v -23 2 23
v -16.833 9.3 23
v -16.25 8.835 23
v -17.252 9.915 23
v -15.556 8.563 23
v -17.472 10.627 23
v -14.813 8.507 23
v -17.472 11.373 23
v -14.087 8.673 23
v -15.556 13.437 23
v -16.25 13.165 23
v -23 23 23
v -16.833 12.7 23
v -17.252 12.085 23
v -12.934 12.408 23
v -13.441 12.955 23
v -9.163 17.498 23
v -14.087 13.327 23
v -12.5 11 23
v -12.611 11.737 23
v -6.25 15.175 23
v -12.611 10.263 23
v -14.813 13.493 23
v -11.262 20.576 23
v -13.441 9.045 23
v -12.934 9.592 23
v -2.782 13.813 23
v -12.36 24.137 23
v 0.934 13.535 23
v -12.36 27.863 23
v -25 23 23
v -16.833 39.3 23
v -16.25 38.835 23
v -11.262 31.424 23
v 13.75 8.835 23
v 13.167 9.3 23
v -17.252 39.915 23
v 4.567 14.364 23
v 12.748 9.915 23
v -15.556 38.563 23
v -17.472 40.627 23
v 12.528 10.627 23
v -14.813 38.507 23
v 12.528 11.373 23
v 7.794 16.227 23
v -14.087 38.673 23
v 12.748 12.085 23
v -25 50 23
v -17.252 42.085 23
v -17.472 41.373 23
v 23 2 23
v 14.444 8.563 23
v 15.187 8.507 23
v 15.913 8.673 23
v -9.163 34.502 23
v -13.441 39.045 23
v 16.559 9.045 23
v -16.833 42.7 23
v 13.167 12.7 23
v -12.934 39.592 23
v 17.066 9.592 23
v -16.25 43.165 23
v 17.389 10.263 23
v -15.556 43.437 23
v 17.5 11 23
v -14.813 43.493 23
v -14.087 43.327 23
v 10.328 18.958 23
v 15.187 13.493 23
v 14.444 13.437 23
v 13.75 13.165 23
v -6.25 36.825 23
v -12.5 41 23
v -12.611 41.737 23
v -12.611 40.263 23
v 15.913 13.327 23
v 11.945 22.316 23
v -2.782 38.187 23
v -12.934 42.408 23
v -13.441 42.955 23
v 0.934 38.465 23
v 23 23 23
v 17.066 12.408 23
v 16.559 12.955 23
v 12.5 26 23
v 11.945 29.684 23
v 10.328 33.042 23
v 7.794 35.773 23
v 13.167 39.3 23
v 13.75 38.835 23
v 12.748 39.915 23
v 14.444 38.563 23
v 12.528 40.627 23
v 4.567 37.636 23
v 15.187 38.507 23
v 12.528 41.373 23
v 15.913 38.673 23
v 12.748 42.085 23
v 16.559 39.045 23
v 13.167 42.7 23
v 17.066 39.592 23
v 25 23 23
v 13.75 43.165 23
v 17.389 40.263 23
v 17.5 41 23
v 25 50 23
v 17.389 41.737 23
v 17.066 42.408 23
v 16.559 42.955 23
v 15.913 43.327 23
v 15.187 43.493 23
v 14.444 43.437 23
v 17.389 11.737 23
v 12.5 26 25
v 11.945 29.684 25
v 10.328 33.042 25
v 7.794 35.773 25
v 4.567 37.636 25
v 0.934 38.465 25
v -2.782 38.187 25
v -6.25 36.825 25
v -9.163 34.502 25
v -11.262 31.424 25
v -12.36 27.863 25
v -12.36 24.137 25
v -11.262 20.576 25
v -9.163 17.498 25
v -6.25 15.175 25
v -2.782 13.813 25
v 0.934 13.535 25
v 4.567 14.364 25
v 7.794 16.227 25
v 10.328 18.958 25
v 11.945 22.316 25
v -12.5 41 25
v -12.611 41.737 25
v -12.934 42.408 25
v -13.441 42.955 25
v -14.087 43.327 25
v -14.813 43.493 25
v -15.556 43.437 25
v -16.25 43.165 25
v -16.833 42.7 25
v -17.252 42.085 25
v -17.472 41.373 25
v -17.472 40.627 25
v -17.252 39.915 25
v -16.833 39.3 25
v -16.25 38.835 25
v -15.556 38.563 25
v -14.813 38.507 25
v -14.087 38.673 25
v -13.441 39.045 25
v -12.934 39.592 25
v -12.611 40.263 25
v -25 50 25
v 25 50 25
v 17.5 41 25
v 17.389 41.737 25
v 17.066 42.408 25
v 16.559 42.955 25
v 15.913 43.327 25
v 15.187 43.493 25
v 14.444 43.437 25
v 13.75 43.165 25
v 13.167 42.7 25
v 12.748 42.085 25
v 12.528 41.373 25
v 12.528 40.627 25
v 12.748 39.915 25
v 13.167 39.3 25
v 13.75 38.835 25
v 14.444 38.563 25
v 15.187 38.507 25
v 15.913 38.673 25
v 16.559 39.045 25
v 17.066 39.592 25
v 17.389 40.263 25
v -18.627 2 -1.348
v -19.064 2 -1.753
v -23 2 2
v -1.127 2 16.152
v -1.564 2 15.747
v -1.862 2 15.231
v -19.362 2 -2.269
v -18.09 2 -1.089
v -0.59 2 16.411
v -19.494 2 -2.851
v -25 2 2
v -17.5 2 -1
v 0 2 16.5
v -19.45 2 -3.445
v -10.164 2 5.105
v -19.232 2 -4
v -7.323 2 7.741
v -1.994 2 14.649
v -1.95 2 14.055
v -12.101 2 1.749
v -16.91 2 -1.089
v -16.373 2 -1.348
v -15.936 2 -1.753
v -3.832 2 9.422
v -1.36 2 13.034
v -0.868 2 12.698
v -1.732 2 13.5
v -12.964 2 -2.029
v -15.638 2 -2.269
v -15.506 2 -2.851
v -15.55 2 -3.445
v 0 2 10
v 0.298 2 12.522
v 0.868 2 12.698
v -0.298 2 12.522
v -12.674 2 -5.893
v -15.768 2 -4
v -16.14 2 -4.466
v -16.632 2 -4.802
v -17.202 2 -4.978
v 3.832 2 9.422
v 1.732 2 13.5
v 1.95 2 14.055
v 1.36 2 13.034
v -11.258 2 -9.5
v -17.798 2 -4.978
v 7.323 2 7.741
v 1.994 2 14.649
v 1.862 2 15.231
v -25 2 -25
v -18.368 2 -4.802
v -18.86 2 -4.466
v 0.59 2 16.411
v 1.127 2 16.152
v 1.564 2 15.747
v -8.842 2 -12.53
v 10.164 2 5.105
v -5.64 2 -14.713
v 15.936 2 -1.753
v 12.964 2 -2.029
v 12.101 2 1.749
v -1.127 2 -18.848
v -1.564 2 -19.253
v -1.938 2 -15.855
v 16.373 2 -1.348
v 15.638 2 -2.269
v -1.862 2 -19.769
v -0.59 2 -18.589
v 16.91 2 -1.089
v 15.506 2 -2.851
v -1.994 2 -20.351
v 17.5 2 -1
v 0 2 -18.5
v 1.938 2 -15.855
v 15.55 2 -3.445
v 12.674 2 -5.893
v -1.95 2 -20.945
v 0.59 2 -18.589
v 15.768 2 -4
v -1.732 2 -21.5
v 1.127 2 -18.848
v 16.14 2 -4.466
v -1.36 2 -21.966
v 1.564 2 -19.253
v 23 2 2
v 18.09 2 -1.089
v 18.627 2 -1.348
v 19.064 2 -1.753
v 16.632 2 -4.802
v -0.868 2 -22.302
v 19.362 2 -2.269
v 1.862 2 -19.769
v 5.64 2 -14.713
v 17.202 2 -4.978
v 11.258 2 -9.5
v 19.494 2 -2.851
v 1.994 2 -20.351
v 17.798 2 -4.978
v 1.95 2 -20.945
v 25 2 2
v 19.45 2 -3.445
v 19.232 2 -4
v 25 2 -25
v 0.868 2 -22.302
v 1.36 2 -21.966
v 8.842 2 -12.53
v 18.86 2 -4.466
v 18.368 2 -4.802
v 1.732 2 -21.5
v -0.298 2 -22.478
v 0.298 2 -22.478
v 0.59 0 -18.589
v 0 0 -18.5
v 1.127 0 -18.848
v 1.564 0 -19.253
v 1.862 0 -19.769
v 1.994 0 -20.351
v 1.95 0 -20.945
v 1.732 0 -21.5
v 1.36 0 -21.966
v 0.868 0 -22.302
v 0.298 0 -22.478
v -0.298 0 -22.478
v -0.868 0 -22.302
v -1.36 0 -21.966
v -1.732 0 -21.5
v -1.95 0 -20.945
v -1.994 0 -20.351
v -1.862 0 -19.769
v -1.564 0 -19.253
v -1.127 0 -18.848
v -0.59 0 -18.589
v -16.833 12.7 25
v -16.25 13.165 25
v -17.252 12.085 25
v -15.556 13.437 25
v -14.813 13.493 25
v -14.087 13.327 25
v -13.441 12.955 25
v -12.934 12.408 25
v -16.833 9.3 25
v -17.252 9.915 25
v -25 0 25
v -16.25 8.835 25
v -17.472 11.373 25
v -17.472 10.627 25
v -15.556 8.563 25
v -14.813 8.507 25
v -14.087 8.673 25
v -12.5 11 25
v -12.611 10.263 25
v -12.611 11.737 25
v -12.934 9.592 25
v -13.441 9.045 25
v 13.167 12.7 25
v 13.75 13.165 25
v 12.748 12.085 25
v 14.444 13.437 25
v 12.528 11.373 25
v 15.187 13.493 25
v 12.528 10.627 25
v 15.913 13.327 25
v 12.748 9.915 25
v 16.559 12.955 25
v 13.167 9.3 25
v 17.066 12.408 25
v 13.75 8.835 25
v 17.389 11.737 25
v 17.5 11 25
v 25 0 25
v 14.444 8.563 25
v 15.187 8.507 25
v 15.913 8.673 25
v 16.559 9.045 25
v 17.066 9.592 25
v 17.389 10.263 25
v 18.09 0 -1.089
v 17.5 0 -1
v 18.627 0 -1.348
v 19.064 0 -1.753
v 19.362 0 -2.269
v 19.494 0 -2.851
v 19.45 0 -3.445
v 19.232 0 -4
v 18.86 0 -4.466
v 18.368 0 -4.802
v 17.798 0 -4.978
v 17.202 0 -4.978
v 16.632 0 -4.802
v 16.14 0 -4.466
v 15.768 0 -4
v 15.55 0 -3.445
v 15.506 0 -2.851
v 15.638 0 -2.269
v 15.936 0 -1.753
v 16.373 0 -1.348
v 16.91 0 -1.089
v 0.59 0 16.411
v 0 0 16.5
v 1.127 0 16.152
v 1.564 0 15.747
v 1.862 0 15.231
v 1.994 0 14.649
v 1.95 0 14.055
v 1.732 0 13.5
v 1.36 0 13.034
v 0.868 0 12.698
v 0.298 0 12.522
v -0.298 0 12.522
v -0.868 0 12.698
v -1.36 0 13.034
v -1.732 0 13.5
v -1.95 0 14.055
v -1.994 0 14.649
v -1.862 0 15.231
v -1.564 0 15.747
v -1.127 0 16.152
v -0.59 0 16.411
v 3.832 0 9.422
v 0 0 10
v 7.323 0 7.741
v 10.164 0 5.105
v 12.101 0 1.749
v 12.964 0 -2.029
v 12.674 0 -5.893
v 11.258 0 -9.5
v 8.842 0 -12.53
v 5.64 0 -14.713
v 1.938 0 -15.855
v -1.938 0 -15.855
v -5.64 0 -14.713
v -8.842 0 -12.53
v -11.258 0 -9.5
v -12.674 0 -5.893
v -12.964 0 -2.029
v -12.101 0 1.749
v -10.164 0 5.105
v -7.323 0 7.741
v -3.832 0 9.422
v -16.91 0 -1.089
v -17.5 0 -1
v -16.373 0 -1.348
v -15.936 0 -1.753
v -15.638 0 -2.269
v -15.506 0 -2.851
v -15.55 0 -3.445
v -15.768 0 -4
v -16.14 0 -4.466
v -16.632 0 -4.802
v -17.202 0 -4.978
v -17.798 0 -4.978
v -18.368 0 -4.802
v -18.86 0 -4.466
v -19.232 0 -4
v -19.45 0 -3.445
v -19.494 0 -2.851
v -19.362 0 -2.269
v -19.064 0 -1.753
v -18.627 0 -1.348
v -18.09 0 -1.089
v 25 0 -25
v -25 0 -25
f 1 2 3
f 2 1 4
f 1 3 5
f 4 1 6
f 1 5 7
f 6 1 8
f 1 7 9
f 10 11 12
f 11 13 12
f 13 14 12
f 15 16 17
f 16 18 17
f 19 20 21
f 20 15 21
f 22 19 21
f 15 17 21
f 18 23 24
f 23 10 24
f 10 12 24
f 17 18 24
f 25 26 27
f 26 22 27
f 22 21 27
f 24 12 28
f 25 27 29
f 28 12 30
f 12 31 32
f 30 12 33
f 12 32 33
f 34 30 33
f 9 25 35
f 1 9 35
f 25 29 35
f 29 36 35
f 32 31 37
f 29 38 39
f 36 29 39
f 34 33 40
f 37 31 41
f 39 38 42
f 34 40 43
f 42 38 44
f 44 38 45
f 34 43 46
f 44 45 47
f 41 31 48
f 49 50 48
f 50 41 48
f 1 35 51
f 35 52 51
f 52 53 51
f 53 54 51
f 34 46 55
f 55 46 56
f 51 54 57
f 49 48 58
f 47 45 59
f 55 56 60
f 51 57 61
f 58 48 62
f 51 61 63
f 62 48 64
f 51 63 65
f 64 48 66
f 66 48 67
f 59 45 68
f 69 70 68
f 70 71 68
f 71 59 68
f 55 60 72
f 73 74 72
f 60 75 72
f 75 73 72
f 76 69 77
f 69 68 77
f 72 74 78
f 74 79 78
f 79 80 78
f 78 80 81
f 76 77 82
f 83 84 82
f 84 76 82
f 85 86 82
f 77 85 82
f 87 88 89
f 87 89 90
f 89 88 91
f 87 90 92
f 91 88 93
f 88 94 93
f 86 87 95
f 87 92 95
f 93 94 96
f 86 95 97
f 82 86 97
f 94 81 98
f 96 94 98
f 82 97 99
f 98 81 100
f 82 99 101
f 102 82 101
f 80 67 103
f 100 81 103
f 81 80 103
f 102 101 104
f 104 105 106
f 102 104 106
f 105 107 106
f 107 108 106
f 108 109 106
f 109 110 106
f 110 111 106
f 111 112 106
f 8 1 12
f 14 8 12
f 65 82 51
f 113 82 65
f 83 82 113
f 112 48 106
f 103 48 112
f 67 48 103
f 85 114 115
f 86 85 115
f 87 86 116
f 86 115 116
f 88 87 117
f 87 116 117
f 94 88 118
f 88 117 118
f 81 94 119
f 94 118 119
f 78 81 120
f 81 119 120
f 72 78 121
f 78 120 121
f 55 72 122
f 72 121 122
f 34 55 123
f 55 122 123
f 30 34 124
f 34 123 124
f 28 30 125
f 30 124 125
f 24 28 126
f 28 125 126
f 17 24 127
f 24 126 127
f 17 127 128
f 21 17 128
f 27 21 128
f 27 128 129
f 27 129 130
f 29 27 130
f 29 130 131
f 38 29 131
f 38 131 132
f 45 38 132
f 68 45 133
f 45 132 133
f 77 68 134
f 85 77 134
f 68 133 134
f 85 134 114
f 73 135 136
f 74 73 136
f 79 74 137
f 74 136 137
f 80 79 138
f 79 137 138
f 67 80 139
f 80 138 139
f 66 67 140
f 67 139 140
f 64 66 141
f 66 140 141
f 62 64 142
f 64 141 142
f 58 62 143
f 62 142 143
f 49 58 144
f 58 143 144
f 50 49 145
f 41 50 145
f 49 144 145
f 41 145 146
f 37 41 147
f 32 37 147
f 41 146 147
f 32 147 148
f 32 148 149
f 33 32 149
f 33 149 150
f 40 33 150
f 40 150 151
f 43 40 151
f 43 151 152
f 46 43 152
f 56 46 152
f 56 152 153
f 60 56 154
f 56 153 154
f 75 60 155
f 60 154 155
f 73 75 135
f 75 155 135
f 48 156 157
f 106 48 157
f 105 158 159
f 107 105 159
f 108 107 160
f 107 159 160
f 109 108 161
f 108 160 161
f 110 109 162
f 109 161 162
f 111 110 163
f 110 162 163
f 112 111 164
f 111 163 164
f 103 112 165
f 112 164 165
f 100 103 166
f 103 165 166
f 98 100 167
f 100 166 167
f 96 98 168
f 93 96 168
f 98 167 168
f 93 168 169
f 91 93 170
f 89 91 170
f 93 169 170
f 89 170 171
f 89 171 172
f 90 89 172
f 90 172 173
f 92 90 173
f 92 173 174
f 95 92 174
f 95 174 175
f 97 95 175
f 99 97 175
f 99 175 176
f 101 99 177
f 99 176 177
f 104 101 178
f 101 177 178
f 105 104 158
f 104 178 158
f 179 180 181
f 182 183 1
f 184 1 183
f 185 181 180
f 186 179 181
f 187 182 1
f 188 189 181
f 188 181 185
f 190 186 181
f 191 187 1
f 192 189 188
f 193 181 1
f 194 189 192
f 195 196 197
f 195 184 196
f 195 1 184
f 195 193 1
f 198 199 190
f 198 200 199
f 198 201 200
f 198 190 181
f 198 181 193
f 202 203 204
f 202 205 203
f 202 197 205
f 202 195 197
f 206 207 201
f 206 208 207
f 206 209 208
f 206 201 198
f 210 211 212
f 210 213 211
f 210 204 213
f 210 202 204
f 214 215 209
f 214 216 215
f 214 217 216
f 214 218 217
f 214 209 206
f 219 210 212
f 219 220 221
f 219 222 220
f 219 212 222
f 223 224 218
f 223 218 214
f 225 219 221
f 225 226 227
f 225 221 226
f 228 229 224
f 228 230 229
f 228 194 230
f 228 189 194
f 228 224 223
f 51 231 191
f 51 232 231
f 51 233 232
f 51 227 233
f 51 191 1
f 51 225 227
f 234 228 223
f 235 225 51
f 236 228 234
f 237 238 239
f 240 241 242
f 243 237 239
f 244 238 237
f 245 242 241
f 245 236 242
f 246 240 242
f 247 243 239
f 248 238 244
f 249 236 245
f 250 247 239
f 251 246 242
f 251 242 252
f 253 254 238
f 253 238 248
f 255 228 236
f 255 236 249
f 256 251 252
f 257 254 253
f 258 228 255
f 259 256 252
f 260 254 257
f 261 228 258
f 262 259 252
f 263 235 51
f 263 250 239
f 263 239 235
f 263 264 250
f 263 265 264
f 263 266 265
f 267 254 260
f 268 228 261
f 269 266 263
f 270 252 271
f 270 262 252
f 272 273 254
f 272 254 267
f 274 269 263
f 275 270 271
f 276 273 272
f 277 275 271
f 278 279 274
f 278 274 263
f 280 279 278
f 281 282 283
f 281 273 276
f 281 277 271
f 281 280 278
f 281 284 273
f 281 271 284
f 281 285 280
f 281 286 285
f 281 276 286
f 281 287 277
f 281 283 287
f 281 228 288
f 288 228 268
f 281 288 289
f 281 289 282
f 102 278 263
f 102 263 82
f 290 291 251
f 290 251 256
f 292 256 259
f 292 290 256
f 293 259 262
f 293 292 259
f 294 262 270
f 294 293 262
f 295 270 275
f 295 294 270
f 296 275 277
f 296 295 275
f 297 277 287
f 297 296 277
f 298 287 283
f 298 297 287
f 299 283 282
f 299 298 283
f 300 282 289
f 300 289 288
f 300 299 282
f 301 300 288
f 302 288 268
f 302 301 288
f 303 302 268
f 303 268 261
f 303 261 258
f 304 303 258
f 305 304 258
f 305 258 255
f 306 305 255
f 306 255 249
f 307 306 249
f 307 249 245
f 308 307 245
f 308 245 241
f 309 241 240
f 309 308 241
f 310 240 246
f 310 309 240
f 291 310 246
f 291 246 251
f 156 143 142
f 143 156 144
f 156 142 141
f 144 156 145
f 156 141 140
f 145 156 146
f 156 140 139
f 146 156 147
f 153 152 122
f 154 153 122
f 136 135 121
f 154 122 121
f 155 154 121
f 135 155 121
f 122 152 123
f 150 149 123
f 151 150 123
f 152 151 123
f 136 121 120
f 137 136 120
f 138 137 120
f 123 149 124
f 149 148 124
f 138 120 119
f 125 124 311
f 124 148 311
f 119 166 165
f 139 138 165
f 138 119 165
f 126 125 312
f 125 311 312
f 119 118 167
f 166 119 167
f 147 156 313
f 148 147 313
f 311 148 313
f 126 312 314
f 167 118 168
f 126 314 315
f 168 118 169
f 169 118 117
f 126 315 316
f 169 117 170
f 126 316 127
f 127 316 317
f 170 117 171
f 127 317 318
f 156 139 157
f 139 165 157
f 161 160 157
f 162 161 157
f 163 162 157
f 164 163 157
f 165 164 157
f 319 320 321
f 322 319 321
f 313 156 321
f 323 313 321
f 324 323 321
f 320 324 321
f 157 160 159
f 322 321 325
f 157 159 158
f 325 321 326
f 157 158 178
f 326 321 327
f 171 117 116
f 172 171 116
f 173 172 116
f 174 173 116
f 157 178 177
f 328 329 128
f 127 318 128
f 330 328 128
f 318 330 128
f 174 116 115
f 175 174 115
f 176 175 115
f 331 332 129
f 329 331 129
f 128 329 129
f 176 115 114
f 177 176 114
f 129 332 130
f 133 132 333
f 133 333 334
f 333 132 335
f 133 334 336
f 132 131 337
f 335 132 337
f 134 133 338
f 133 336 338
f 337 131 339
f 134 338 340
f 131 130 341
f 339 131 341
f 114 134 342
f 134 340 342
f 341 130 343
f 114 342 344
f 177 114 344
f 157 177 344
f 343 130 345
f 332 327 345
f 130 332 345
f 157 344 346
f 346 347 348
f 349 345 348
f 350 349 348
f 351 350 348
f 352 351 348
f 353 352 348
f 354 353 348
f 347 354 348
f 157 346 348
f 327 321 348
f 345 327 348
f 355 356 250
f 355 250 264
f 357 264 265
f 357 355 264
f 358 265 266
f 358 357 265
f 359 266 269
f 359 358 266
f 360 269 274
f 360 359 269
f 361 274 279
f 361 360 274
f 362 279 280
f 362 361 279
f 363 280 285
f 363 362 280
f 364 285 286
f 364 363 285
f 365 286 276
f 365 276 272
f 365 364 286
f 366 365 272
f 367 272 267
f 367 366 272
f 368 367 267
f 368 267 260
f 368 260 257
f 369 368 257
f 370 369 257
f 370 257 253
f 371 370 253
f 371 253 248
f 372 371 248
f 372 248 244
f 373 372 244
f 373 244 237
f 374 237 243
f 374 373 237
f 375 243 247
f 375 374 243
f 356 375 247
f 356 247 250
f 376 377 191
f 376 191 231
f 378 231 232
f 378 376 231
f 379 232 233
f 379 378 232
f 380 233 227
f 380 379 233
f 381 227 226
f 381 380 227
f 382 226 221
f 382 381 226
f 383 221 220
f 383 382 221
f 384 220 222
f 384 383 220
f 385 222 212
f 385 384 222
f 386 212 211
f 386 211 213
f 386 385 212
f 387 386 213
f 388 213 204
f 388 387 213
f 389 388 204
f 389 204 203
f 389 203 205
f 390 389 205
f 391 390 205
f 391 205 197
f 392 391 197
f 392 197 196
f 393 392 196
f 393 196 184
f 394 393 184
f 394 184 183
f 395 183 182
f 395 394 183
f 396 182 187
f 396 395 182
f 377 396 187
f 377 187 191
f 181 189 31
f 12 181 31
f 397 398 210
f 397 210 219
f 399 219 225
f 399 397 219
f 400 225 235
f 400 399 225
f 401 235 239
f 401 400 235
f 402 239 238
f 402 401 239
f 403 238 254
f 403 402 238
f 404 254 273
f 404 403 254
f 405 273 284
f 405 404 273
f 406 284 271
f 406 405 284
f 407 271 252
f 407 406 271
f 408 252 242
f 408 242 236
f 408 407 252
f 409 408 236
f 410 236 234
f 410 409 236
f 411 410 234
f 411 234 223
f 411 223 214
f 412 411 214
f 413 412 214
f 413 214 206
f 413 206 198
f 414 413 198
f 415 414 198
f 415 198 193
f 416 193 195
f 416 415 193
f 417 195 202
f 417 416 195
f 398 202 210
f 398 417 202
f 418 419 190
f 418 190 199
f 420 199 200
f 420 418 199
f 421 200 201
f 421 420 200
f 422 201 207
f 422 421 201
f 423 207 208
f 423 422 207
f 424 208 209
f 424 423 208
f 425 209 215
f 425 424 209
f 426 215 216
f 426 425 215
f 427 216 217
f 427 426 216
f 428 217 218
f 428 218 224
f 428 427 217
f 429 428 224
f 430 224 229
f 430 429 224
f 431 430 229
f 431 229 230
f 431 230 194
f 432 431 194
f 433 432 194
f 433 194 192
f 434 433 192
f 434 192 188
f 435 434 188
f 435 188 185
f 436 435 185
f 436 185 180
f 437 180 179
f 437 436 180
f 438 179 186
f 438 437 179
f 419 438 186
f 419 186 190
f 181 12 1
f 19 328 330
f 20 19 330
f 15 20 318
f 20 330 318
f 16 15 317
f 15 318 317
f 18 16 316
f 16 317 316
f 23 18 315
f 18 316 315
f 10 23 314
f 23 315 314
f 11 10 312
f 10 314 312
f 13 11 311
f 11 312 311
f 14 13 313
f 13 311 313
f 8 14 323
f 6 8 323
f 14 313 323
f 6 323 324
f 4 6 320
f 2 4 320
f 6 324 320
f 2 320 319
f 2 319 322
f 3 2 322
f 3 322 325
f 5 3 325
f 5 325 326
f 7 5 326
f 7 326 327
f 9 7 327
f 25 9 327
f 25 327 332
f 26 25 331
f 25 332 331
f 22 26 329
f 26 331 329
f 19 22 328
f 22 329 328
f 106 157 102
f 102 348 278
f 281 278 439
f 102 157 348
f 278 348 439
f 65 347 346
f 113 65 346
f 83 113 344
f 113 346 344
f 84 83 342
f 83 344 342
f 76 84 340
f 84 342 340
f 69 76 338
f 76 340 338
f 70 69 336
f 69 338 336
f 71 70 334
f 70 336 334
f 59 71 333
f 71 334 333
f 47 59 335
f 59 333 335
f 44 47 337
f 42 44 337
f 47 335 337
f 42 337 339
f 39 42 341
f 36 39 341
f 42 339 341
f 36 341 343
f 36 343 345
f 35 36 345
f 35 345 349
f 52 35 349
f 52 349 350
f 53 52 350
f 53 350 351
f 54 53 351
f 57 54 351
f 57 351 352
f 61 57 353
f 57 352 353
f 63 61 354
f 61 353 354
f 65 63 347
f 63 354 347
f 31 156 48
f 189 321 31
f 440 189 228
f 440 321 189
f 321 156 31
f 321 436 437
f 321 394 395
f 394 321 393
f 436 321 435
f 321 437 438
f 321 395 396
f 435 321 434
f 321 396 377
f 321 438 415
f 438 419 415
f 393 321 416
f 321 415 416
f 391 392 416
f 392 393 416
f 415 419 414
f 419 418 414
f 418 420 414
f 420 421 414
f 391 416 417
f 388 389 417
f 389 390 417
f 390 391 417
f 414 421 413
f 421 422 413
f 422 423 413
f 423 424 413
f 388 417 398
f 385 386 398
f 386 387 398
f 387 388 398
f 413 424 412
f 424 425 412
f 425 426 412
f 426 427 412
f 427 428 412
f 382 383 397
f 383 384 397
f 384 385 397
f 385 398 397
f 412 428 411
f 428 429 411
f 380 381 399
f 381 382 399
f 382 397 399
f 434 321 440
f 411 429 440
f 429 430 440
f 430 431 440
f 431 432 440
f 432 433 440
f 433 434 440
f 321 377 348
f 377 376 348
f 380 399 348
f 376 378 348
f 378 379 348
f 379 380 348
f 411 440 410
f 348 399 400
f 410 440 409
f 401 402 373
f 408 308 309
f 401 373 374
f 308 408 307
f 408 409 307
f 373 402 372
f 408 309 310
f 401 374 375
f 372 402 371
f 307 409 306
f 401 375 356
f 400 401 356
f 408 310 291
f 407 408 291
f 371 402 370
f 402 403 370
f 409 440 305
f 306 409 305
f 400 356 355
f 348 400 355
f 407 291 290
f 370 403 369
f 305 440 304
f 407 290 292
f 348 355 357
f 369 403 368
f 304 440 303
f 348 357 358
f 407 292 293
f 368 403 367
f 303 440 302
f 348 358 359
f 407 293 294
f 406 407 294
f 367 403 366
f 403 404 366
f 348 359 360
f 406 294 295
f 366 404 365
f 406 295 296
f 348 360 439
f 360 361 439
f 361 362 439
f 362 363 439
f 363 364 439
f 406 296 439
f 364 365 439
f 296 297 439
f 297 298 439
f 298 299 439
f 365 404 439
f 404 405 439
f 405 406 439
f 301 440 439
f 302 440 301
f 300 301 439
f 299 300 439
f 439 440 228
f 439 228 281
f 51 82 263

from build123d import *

# Parameters (mm, degrees)
SKETCH_1_W      = 50
SKETCH_1_H      = 50
SKETCH_1_R      = 13
SKETCH_1_R_2    = 2
EXTRUDE_1_DEPTH = 2
SKETCH_2_W      = 50
SKETCH_2_H      = 50
SKETCH_2_R      = 12.5
SKETCH_2_R_2    = 2.5
EXTRUDE_2_DEPTH = 2
EXTRUDE_3_DEPTH = 2


with BuildPart() as part:
    # 草图1 → 凸台-拉伸1 (new body)
    with BuildSketch(Plane(origin=(0, 0, 0), x_dir=(1, 0, 0), z_dir=(0, 1, 0))):
        Rectangle(SKETCH_1_W, SKETCH_1_H)
        with Locations(Location((0, 3, 0), (0, 0, 270))):
            Circle(SKETCH_1_R, mode=Mode.SUBTRACT)
        with Locations(Location((0, 20.5, 0), (0, 0, 270))):
            Circle(SKETCH_1_R_2, mode=Mode.SUBTRACT)
        with Locations(Location((0, -14.5, 0), (0, 0, 270))):
            Circle(SKETCH_1_R_2, mode=Mode.SUBTRACT)
        with Locations(Location((17.5, 3, 0), (0, 0, 270))):
            Circle(SKETCH_1_R_2, mode=Mode.SUBTRACT)
        with Locations(Location((-17.5, 3, 0), (0, 0, 270))):
            Circle(SKETCH_1_R_2, mode=Mode.SUBTRACT)
    extrude(amount=EXTRUDE_1_DEPTH)

    # 草图2 → 凸台-拉伸2 (add)
    with BuildSketch(Plane.XY.offset(25)):
        with Locations((0, 25)):
            Rectangle(SKETCH_2_W, SKETCH_2_H)
        with Locations((0, 26)):
            Circle(SKETCH_2_R, mode=Mode.SUBTRACT)
        with Locations((-15, 41)):
            Circle(SKETCH_2_R_2, mode=Mode.SUBTRACT)
        with Locations((15, 41)):
            Circle(SKETCH_2_R_2, mode=Mode.SUBTRACT)
        with Locations((15, 11)):
            Circle(SKETCH_2_R_2, mode=Mode.SUBTRACT)
        with Locations((-15, 11)):
            Circle(SKETCH_2_R_2, mode=Mode.SUBTRACT)
    extrude(amount=-EXTRUDE_2_DEPTH)

    # 草图3 → 凸台-拉伸3 (add)
    with BuildSketch(Plane(origin=(25, 0, 0), x_dir=(0, 0, -1), z_dir=(1, 0, 0))):
        Polygon((-25, 0), (0, 0), (-25, 25), align=None)
    extrude_3 = extrude(amount=-EXTRUDE_3_DEPTH)

    # 镜向2: 凸台-拉伸3 across plane
    add(extrude_3.mirror(Plane(origin=(0, 0, 0), x_dir=(0, 0, 1), z_dir=(1, 0, 0))))


solid = part.part
